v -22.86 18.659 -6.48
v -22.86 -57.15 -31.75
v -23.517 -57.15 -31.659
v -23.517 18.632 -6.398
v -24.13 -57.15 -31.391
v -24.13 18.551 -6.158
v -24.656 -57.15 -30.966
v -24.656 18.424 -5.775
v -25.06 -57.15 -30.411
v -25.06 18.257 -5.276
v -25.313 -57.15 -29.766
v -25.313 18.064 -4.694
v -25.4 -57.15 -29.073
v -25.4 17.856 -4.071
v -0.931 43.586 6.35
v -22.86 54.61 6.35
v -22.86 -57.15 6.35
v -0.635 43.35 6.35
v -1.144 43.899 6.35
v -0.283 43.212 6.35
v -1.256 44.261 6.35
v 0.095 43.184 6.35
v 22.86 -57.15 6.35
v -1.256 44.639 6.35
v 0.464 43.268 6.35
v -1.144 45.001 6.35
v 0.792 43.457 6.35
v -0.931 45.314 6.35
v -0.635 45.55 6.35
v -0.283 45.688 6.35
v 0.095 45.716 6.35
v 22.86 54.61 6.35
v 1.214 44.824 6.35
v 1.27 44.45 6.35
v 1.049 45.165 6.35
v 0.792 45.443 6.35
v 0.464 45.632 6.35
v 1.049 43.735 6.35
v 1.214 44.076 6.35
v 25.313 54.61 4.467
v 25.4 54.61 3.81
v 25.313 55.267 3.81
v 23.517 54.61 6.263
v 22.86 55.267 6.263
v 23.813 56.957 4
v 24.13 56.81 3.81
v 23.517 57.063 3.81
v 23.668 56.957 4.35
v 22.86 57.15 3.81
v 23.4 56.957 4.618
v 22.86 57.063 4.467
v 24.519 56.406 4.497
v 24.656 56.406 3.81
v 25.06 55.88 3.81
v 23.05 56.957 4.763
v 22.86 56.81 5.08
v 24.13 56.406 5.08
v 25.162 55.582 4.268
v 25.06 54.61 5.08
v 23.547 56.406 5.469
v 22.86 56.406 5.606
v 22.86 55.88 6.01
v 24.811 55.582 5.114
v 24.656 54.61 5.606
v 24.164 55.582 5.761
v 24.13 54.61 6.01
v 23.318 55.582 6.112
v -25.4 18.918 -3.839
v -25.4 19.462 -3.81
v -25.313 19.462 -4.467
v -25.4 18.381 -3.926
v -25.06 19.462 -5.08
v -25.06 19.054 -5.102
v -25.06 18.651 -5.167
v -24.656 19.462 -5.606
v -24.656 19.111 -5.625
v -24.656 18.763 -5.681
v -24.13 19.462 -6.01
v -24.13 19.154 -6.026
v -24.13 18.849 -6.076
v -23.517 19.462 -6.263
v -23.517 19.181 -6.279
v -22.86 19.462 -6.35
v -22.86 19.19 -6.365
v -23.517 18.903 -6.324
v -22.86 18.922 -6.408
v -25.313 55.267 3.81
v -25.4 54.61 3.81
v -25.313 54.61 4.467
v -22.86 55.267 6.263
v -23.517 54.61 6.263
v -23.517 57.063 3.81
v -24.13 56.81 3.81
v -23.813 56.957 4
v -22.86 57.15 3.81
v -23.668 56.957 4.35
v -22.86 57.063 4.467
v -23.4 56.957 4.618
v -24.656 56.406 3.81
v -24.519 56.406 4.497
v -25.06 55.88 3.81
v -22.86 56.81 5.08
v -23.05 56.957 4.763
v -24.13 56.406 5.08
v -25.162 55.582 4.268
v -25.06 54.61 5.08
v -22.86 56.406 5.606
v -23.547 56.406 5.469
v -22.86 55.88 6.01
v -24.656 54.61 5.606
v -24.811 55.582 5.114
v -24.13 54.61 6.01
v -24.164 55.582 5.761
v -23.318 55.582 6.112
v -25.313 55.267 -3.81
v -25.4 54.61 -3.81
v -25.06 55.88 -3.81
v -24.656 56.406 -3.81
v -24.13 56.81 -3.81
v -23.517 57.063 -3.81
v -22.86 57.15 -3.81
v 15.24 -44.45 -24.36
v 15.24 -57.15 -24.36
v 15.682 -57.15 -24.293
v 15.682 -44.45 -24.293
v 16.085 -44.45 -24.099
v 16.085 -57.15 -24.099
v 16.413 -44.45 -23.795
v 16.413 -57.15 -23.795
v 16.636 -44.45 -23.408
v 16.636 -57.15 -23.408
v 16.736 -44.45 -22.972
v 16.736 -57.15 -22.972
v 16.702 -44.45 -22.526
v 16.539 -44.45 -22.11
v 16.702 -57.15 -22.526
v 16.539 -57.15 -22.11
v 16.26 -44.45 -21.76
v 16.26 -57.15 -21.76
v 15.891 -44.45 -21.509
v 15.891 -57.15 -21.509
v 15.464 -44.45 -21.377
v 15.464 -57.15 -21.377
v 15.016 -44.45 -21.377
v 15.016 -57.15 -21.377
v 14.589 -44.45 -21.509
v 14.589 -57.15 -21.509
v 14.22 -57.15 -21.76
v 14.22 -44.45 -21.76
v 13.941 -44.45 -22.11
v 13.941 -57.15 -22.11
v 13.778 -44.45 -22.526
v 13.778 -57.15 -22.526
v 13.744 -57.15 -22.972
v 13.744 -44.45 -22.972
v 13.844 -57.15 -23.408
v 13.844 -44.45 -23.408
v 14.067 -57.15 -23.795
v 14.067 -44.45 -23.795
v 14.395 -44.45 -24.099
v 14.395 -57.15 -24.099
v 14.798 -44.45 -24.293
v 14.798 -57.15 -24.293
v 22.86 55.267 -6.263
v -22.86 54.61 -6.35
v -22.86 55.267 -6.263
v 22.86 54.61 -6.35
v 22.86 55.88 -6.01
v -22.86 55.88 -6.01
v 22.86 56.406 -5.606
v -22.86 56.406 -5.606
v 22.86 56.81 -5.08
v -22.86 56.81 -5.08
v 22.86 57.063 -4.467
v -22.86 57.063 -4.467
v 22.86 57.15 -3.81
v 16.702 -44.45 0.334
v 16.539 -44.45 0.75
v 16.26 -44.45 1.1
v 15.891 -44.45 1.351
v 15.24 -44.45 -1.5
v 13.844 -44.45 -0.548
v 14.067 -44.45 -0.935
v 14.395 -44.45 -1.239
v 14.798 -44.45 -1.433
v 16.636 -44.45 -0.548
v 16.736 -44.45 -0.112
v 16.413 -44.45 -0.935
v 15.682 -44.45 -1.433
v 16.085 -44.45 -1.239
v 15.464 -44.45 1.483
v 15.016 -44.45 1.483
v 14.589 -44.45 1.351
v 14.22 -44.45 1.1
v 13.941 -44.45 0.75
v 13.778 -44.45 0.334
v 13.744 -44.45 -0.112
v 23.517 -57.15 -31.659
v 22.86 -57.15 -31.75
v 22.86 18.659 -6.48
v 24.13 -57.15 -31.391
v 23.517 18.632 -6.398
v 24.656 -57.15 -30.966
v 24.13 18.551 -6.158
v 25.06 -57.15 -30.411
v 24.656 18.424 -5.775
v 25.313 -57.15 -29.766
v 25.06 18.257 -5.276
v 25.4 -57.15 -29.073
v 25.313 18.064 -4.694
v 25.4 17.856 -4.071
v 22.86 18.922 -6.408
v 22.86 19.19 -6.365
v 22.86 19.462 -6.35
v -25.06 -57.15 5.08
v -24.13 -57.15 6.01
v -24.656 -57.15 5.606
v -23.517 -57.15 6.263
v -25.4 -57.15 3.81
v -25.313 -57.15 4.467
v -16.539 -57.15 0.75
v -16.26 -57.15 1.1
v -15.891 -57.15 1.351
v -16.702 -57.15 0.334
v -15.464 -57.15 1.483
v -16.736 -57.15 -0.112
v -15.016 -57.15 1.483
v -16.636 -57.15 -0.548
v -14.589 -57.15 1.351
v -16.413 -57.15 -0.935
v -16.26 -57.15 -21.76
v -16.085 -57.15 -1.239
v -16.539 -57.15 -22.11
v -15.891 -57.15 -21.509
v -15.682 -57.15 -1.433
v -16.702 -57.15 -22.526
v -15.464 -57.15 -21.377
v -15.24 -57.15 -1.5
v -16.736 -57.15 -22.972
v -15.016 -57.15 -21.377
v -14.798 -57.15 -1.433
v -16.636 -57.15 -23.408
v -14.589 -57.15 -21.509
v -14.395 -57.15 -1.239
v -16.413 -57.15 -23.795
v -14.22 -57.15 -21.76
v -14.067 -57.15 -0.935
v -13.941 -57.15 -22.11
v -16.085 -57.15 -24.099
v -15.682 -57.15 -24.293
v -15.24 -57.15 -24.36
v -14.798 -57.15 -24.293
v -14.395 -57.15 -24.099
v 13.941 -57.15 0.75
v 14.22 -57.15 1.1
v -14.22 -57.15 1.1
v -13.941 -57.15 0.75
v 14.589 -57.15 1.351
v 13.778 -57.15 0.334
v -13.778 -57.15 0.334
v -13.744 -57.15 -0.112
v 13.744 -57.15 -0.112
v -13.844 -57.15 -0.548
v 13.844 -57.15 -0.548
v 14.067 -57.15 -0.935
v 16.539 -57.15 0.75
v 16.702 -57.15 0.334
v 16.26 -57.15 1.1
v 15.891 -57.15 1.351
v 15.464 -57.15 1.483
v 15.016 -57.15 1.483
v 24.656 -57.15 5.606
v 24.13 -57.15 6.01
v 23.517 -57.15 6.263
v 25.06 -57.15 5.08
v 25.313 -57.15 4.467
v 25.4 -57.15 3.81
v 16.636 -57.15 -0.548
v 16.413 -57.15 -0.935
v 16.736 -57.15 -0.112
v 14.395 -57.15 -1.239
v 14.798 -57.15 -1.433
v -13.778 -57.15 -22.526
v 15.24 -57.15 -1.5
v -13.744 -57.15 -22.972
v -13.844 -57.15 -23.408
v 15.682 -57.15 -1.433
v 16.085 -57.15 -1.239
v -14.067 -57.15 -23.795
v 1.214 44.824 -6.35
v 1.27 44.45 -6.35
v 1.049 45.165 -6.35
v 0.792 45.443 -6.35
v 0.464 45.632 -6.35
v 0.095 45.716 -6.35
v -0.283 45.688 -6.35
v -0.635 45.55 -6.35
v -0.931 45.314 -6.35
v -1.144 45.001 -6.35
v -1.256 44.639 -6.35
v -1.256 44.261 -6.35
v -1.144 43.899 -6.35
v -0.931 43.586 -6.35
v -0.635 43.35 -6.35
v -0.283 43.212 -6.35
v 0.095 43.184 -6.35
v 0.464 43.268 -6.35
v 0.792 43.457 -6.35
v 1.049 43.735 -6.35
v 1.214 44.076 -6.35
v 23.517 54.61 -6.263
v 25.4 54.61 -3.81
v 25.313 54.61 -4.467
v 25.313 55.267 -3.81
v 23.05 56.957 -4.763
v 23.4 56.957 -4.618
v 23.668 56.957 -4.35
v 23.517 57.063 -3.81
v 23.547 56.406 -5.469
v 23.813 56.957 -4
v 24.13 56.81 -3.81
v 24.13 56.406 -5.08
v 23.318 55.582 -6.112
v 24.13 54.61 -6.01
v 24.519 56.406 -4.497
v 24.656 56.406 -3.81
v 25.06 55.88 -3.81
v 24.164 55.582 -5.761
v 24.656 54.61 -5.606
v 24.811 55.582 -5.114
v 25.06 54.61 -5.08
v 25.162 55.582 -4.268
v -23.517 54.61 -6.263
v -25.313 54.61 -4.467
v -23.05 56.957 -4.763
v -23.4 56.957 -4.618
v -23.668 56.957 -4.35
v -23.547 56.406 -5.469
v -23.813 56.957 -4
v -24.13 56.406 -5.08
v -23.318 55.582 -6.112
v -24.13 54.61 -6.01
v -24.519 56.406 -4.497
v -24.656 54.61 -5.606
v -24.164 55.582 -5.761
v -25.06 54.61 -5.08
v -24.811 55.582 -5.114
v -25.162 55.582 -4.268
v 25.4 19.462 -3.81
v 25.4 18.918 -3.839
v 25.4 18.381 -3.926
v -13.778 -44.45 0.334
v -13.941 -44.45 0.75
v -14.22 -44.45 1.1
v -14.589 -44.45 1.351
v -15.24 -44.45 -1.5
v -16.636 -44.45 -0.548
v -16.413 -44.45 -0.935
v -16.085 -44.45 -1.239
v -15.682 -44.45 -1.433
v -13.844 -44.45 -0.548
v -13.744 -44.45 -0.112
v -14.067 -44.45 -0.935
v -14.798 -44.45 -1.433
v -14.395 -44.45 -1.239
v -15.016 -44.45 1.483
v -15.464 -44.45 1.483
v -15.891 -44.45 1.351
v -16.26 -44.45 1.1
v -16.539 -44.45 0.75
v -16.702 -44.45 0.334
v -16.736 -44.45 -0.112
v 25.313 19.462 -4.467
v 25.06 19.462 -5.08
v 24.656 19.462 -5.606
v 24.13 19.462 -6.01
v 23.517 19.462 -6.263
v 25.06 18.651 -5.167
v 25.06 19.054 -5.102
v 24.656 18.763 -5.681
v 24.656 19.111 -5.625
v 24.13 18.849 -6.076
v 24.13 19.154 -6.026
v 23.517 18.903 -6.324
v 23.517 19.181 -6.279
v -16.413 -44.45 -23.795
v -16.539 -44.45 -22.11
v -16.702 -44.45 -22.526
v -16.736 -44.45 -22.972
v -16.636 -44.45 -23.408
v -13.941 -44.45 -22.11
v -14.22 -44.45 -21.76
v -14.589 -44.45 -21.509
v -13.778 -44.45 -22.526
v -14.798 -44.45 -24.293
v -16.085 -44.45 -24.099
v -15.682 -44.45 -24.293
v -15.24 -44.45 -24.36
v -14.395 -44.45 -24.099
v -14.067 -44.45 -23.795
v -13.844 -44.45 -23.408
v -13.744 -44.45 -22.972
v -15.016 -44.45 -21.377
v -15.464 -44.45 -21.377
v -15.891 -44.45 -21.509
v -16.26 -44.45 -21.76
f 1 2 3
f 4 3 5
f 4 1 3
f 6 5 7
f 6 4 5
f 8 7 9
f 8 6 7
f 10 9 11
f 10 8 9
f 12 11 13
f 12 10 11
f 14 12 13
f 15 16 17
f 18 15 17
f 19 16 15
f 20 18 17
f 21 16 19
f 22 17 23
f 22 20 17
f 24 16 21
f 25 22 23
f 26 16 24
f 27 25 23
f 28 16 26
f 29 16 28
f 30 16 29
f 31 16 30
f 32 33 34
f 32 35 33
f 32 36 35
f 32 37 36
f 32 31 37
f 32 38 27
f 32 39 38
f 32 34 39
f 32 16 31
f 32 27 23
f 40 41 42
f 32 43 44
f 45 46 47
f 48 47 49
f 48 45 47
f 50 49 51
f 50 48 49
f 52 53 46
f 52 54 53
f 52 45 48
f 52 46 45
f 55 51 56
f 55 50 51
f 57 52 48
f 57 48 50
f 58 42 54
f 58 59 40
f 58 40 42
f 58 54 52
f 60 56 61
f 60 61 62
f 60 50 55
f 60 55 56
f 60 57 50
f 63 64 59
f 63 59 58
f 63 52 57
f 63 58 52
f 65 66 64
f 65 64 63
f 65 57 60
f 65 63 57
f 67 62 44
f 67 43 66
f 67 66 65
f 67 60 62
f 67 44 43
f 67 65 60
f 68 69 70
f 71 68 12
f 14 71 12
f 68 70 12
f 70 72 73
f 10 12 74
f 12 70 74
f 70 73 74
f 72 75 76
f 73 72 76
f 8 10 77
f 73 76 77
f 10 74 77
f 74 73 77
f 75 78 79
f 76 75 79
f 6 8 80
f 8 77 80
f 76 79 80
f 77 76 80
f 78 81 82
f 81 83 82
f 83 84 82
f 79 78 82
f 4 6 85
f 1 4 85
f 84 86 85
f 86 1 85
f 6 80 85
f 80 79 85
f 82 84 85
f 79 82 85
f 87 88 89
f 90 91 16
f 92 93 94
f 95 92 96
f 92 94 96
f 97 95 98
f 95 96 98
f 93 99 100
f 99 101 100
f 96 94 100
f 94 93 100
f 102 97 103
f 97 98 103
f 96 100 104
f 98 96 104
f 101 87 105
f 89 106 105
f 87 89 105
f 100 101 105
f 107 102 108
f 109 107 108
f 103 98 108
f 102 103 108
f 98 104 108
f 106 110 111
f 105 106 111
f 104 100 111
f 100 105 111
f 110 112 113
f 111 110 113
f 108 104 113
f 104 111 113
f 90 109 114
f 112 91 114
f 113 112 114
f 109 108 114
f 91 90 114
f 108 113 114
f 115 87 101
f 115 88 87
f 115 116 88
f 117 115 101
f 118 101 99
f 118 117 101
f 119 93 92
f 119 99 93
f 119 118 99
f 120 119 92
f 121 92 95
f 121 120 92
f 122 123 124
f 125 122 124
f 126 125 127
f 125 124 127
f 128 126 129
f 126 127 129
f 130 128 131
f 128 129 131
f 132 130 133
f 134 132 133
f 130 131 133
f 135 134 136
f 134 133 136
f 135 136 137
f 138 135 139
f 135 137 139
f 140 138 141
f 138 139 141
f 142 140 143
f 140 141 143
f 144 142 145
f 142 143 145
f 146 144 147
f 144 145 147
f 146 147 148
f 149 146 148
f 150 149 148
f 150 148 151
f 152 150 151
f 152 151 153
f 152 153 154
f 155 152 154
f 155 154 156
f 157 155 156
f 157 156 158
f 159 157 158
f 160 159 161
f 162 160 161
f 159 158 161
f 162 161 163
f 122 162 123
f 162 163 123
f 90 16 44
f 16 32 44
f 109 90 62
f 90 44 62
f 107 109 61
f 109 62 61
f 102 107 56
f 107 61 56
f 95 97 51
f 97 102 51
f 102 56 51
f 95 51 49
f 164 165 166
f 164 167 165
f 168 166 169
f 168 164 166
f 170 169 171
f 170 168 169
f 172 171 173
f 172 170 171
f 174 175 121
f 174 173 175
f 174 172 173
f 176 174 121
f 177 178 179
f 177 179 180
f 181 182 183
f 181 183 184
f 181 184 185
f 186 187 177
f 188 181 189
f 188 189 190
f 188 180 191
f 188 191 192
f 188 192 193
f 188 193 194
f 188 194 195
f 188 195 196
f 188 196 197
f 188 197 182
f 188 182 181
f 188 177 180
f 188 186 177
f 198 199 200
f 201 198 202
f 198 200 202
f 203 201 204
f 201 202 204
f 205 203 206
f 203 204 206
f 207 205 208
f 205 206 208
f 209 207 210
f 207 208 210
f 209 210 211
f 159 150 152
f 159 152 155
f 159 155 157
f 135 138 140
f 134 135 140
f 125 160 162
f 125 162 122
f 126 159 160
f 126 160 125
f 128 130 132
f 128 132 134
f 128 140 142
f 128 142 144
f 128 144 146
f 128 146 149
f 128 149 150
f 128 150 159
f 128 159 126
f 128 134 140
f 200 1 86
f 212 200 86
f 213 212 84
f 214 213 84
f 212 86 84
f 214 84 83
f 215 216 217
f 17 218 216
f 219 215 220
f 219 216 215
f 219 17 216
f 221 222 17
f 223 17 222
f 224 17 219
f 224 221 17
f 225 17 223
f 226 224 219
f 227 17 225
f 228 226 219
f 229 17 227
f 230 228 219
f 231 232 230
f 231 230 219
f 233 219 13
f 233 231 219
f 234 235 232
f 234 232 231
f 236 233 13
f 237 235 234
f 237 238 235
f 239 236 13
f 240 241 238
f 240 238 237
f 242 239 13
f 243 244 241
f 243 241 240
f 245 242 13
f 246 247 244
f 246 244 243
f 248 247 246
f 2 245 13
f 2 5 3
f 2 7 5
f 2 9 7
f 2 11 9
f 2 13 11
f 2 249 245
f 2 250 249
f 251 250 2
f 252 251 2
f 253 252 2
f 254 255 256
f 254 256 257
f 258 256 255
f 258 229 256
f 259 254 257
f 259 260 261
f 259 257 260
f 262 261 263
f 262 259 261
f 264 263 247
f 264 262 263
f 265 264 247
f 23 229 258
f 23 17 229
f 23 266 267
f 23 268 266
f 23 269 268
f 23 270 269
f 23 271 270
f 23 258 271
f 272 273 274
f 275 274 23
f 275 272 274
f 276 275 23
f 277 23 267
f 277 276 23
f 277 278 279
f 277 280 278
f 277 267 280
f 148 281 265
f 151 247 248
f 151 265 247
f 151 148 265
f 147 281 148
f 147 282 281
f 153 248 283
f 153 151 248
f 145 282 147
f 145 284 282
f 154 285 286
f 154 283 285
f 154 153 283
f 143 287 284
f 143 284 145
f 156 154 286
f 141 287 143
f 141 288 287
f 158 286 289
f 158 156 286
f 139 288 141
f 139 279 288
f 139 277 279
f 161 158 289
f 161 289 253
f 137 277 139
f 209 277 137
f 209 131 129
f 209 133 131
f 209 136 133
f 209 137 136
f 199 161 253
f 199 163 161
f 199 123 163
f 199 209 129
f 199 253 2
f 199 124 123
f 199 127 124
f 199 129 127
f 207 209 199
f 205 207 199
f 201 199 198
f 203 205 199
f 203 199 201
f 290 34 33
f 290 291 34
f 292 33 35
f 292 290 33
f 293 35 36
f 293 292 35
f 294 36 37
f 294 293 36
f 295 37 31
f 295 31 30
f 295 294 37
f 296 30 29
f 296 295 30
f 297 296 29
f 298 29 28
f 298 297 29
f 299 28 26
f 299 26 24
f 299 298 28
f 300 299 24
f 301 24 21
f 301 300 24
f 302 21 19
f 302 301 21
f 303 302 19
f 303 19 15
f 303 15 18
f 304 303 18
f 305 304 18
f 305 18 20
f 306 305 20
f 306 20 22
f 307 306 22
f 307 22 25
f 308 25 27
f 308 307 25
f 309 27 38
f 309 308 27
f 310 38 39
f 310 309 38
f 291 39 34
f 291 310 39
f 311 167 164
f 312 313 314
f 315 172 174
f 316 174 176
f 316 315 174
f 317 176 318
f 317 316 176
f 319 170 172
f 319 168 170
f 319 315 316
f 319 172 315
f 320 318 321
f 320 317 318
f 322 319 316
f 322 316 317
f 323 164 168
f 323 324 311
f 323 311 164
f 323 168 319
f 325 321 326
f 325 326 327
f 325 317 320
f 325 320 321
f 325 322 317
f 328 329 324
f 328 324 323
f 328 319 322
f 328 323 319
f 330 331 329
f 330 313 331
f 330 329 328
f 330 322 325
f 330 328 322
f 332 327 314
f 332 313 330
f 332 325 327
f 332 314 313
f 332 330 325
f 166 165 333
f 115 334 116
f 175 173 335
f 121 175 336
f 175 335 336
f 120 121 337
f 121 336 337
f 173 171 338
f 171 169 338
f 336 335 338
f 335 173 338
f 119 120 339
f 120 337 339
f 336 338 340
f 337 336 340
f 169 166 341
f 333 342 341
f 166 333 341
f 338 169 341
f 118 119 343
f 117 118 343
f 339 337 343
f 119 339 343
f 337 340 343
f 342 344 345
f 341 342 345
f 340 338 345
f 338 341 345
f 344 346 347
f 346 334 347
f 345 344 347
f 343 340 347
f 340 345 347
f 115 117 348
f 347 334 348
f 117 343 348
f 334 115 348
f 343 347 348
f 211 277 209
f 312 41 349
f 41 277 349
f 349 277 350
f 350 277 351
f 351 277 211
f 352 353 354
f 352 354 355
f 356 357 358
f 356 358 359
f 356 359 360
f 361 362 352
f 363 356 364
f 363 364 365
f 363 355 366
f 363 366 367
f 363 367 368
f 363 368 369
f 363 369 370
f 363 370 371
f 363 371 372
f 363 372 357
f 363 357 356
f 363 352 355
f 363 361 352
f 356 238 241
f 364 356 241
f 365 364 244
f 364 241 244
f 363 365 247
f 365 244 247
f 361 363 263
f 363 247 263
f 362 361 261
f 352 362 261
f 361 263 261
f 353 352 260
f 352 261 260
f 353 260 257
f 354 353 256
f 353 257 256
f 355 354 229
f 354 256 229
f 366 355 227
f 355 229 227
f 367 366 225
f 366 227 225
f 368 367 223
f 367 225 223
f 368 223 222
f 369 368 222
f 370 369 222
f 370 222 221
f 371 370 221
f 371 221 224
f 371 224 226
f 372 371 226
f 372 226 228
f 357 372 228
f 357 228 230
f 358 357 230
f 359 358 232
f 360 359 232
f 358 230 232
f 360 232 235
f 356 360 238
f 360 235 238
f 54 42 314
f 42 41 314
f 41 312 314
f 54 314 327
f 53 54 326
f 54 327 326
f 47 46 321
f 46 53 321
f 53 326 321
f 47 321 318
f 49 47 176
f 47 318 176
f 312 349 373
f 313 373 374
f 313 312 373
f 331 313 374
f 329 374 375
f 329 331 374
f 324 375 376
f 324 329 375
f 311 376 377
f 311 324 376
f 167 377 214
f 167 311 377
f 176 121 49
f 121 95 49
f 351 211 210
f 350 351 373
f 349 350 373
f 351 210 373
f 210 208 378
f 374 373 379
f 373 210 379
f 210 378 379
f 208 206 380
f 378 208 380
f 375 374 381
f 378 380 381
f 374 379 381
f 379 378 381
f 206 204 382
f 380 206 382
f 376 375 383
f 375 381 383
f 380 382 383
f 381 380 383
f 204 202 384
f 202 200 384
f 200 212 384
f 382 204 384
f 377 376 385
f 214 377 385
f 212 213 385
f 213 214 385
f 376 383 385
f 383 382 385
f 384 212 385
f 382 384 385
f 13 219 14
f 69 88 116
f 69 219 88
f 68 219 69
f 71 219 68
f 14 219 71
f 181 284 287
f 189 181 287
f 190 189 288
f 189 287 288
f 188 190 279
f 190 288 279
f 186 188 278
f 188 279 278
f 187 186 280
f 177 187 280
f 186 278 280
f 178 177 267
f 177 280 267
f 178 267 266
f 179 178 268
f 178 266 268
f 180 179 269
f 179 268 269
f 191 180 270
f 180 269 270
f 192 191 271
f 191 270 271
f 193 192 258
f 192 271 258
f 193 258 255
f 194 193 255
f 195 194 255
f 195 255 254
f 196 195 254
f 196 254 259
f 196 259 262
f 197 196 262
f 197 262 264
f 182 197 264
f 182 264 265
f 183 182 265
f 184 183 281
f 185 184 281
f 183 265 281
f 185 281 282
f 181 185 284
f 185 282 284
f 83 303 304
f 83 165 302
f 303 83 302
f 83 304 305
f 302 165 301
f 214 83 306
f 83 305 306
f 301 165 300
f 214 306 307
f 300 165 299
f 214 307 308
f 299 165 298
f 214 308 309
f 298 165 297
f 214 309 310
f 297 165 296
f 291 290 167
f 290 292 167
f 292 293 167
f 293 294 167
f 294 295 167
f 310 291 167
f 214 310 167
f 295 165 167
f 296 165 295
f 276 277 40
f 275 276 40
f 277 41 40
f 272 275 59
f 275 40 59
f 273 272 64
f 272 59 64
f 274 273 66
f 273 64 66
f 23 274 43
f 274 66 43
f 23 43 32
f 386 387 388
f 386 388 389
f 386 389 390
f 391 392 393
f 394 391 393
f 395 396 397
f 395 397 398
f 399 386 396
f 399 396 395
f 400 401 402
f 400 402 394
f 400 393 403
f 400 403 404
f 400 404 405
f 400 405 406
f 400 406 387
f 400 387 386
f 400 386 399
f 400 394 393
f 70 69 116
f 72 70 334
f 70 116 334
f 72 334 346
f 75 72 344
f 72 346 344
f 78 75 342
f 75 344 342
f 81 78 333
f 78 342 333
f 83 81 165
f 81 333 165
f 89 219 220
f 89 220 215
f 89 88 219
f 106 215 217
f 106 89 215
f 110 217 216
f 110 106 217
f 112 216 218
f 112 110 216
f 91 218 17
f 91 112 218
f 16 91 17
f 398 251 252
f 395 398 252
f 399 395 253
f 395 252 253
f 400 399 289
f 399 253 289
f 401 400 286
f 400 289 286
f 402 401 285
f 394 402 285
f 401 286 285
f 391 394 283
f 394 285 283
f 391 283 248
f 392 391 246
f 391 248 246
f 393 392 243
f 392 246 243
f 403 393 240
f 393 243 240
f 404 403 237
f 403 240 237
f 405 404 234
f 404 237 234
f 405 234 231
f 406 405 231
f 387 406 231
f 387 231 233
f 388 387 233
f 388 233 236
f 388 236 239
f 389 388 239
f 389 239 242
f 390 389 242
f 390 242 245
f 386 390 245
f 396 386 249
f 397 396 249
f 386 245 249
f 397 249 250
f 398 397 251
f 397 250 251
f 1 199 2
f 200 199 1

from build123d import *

# Parameters (mm, degrees)
SKETCH1_W           = 50.8
SKETCH1_H           = 114.3
SKETCH1_R           = 1.27
BOSS_EXTRUDE1_DEPTH = 6.35
BOSS_EXTRUDE2_DEPTH = 50.8
SKETCH2_R           = 1.5
CUT_EXTRUDE1_DEPTH  = 12.7
FILLET1_R           = 2.54


with BuildPart() as part:
    # Sketch1 → Boss-Extrude1 (new, symmetric)
    with BuildSketch(Plane.XY):
        Rectangle(SKETCH1_W, SKETCH1_H)
        with Locations((0, 44.45)):
            Circle(SKETCH1_R, mode=Mode.SUBTRACT)
    extrude(amount=BOSS_EXTRUDE1_DEPTH, both=True)

    # Sketch3 → Boss-Extrude2 (add, through all)
    with BuildSketch(Plane(origin=(25.4, 0, 0), x_dir=(0, 0, -1), z_dir=(1, 0, 0))):
        Polygon((6.35, -57.15), (31.75, -57.15), (6.35, 19.05), align=None)
    extrude(amount=-BOSS_EXTRUDE2_DEPTH)

    # Sketch2 → Cut-Extrude1 (cut)
    with BuildSketch(Plane.XZ.offset(57.15)):
        with Locations(Location((-15.24, 0, 0), (0, 0, 270))):
            Circle(SKETCH2_R)
        with Locations(Location((15.24, 0, 0), (0, 0, 270))):
            Circle(SKETCH2_R)
        with Locations(Location((-15.24, -22.86, 0), (0, 0, 270))):
            Circle(SKETCH2_R)
        with Locations(Location((15.24, -22.86, 0), (0, 0, 270))):
            Circle(SKETCH2_R)
    extrude(amount=-CUT_EXTRUDE1_DEPTH, mode=Mode.SUBTRACT)

    # Fillet1
    fillet1_edges = [part.edges().sort_by_distance(p)[0] for p in [
        (-25.4, 0, 6.35),
        (25.4, 38.1, -6.35),
        (-25.4, -19.05, -19.05),
        (0, 19.05, -6.35),
        (25.4, -19.05, -19.05),
        (25.4, 0, 6.35),
        (-25.4, 38.1, -6.35),
        (0, 57.15, -6.35),
        (-25.4, 57.15, 0),
        (25.4, 57.15, 0),
        (0, 57.15, 6.35),
    ]]
    fillet(fillet1_edges, radius=FILLET1_R)


solid = part.part
